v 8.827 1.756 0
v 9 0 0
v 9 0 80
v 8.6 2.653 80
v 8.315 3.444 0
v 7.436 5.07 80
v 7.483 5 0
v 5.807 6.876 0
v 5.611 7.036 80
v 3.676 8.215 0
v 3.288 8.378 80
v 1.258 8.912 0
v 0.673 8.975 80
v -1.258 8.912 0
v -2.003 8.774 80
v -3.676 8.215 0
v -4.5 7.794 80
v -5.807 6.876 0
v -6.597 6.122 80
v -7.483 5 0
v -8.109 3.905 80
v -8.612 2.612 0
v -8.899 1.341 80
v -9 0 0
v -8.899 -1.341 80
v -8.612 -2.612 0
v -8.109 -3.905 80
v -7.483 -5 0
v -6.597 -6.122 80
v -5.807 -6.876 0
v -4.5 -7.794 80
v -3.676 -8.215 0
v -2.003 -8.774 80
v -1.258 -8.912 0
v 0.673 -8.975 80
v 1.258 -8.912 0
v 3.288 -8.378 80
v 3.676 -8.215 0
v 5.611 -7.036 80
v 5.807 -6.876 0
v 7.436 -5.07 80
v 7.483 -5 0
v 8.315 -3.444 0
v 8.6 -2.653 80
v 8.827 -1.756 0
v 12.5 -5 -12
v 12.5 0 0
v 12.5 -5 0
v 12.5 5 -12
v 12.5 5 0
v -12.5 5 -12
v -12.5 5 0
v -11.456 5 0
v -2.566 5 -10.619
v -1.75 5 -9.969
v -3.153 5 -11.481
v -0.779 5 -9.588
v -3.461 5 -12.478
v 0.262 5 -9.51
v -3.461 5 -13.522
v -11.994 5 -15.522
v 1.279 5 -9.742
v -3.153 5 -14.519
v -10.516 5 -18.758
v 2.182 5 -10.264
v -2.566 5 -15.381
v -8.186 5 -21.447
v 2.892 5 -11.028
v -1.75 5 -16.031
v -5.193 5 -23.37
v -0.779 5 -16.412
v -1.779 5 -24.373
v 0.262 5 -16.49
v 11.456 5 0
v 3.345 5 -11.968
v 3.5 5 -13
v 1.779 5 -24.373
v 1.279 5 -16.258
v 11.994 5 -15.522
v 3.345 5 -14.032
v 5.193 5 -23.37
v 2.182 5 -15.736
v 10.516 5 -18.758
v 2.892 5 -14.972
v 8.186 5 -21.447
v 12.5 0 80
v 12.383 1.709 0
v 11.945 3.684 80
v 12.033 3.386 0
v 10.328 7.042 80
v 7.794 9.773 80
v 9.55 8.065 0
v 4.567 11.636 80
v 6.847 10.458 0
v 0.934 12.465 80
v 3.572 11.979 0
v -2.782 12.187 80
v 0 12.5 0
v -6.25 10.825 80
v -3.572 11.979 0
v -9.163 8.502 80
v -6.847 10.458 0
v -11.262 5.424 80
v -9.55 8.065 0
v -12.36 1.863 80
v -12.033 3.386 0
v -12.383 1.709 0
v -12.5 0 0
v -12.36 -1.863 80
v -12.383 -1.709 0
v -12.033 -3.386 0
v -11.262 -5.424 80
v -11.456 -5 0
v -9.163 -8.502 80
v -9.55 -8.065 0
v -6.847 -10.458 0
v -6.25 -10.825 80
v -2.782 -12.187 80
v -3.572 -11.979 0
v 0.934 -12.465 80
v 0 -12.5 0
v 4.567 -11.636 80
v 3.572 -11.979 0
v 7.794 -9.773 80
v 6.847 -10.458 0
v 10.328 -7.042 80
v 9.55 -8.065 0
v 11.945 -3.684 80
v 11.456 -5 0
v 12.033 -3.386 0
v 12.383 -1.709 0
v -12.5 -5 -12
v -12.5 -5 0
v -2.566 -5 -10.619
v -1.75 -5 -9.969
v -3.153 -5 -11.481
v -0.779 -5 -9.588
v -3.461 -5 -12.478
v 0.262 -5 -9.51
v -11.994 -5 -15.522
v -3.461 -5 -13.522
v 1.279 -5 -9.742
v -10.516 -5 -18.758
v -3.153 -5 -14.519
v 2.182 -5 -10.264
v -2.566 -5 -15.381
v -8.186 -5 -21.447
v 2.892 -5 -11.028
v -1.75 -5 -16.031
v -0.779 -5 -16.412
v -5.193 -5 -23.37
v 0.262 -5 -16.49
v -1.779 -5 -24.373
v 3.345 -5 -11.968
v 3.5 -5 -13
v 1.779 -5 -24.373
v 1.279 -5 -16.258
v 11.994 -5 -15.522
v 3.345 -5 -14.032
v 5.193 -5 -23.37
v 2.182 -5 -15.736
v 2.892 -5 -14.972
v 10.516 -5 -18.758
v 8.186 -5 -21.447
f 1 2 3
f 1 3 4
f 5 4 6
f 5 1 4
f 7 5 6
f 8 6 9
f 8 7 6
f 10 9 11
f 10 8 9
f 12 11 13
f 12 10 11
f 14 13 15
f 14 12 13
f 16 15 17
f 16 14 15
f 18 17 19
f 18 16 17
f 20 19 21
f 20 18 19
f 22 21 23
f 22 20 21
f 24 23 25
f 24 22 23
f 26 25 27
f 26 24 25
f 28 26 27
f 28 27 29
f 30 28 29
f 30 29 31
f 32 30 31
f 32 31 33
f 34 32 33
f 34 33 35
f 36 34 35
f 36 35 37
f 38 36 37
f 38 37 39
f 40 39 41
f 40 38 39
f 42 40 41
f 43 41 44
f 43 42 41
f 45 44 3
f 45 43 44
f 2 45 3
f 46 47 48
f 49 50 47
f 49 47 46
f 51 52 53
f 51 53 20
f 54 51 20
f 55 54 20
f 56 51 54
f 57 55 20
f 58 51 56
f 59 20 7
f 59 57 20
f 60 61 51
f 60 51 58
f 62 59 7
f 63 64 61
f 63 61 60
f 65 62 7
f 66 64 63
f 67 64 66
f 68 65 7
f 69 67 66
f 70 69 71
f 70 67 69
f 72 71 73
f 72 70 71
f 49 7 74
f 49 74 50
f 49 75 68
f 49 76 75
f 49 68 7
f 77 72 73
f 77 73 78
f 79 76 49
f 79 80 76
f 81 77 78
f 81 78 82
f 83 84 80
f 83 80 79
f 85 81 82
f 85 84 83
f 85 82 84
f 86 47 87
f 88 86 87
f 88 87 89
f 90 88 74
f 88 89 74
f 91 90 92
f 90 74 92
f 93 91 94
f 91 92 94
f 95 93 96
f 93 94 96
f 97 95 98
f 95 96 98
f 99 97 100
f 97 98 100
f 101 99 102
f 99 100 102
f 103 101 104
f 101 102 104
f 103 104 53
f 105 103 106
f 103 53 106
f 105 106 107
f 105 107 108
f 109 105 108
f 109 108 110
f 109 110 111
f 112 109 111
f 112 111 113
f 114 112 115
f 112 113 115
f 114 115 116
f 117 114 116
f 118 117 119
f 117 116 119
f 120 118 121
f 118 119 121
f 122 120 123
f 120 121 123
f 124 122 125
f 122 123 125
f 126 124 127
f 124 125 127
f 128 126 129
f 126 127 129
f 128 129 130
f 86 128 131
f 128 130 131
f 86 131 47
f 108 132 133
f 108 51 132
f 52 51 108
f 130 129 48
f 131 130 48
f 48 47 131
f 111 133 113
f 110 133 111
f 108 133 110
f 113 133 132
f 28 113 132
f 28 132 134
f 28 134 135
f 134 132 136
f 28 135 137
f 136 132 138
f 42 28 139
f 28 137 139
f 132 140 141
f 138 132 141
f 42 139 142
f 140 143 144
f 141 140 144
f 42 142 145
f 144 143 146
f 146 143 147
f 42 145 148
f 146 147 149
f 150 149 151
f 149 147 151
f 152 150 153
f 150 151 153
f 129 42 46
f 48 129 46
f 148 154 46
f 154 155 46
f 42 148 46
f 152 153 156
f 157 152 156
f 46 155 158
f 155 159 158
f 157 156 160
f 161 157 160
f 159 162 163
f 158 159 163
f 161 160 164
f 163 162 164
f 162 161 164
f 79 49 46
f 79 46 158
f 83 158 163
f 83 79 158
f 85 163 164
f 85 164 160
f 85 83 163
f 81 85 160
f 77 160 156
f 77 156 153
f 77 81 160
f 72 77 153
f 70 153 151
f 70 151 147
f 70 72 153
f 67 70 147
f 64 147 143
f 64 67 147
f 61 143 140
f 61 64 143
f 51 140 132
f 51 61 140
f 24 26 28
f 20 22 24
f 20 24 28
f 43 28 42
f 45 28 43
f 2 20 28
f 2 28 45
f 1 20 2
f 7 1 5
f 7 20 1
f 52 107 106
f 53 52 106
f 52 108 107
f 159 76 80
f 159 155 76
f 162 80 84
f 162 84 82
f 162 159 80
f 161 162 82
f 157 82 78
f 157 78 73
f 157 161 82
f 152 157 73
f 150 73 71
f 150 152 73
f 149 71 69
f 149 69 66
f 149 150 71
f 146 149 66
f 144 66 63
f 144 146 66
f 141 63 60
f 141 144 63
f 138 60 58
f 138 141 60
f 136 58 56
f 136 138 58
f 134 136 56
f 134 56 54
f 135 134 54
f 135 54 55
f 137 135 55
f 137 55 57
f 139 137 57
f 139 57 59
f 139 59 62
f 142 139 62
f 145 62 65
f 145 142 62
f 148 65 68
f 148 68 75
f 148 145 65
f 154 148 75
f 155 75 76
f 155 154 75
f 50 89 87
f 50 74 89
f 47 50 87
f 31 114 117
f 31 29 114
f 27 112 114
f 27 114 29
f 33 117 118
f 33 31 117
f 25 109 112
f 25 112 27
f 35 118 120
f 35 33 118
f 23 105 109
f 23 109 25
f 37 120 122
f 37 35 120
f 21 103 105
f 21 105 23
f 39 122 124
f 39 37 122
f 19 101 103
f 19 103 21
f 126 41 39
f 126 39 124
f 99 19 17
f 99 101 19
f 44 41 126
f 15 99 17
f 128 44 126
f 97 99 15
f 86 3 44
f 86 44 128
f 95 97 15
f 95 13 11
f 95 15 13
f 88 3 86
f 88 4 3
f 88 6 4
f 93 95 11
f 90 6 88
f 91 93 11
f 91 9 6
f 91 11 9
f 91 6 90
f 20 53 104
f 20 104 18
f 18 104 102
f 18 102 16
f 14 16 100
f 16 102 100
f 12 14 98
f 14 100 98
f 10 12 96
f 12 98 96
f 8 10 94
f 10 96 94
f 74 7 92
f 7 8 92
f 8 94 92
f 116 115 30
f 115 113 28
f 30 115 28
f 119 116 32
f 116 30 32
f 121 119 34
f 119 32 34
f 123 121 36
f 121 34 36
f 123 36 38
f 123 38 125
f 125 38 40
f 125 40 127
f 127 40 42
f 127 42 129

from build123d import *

# Parameters (mm, degrees)
SKETCH1_R           = 12.5
SKETCH1_R_2         = 9
BOSS_EXTRUDE1_DEPTH = 80
SKETCH2_R           = 3.5
BOSS_EXTRUDE2_DEPTH = 5


with BuildPart() as part:
    # Sketch1 → Boss-Extrude1 (new body)
    with BuildSketch(Plane.XY):
        Circle(SKETCH1_R)
        Circle(SKETCH1_R_2, mode=Mode.SUBTRACT)
    extrude(amount=BOSS_EXTRUDE1_DEPTH)

    # Sketch2 → Boss-Extrude2 (add, symmetric)
    with BuildSketch(Plane(origin=(0, 0, 0), x_dir=(1, 0, 0), z_dir=(0, 1, 0))):
        with BuildLine():
            Line((-12.5, 0), (12.5, 0))
            Line((12.5, 0), (12.5, 12))
            ThreePointArc((12.5, 12), (0, 24.5), (-12.5, 12))
            Line((-12.5, 12), (-12.5, 0))
        make_face()
        with Locations((0, 13)):
            Circle(SKETCH2_R, mode=Mode.SUBTRACT)
    extrude(amount=BOSS_EXTRUDE2_DEPTH, both=True)


solid = part.part
